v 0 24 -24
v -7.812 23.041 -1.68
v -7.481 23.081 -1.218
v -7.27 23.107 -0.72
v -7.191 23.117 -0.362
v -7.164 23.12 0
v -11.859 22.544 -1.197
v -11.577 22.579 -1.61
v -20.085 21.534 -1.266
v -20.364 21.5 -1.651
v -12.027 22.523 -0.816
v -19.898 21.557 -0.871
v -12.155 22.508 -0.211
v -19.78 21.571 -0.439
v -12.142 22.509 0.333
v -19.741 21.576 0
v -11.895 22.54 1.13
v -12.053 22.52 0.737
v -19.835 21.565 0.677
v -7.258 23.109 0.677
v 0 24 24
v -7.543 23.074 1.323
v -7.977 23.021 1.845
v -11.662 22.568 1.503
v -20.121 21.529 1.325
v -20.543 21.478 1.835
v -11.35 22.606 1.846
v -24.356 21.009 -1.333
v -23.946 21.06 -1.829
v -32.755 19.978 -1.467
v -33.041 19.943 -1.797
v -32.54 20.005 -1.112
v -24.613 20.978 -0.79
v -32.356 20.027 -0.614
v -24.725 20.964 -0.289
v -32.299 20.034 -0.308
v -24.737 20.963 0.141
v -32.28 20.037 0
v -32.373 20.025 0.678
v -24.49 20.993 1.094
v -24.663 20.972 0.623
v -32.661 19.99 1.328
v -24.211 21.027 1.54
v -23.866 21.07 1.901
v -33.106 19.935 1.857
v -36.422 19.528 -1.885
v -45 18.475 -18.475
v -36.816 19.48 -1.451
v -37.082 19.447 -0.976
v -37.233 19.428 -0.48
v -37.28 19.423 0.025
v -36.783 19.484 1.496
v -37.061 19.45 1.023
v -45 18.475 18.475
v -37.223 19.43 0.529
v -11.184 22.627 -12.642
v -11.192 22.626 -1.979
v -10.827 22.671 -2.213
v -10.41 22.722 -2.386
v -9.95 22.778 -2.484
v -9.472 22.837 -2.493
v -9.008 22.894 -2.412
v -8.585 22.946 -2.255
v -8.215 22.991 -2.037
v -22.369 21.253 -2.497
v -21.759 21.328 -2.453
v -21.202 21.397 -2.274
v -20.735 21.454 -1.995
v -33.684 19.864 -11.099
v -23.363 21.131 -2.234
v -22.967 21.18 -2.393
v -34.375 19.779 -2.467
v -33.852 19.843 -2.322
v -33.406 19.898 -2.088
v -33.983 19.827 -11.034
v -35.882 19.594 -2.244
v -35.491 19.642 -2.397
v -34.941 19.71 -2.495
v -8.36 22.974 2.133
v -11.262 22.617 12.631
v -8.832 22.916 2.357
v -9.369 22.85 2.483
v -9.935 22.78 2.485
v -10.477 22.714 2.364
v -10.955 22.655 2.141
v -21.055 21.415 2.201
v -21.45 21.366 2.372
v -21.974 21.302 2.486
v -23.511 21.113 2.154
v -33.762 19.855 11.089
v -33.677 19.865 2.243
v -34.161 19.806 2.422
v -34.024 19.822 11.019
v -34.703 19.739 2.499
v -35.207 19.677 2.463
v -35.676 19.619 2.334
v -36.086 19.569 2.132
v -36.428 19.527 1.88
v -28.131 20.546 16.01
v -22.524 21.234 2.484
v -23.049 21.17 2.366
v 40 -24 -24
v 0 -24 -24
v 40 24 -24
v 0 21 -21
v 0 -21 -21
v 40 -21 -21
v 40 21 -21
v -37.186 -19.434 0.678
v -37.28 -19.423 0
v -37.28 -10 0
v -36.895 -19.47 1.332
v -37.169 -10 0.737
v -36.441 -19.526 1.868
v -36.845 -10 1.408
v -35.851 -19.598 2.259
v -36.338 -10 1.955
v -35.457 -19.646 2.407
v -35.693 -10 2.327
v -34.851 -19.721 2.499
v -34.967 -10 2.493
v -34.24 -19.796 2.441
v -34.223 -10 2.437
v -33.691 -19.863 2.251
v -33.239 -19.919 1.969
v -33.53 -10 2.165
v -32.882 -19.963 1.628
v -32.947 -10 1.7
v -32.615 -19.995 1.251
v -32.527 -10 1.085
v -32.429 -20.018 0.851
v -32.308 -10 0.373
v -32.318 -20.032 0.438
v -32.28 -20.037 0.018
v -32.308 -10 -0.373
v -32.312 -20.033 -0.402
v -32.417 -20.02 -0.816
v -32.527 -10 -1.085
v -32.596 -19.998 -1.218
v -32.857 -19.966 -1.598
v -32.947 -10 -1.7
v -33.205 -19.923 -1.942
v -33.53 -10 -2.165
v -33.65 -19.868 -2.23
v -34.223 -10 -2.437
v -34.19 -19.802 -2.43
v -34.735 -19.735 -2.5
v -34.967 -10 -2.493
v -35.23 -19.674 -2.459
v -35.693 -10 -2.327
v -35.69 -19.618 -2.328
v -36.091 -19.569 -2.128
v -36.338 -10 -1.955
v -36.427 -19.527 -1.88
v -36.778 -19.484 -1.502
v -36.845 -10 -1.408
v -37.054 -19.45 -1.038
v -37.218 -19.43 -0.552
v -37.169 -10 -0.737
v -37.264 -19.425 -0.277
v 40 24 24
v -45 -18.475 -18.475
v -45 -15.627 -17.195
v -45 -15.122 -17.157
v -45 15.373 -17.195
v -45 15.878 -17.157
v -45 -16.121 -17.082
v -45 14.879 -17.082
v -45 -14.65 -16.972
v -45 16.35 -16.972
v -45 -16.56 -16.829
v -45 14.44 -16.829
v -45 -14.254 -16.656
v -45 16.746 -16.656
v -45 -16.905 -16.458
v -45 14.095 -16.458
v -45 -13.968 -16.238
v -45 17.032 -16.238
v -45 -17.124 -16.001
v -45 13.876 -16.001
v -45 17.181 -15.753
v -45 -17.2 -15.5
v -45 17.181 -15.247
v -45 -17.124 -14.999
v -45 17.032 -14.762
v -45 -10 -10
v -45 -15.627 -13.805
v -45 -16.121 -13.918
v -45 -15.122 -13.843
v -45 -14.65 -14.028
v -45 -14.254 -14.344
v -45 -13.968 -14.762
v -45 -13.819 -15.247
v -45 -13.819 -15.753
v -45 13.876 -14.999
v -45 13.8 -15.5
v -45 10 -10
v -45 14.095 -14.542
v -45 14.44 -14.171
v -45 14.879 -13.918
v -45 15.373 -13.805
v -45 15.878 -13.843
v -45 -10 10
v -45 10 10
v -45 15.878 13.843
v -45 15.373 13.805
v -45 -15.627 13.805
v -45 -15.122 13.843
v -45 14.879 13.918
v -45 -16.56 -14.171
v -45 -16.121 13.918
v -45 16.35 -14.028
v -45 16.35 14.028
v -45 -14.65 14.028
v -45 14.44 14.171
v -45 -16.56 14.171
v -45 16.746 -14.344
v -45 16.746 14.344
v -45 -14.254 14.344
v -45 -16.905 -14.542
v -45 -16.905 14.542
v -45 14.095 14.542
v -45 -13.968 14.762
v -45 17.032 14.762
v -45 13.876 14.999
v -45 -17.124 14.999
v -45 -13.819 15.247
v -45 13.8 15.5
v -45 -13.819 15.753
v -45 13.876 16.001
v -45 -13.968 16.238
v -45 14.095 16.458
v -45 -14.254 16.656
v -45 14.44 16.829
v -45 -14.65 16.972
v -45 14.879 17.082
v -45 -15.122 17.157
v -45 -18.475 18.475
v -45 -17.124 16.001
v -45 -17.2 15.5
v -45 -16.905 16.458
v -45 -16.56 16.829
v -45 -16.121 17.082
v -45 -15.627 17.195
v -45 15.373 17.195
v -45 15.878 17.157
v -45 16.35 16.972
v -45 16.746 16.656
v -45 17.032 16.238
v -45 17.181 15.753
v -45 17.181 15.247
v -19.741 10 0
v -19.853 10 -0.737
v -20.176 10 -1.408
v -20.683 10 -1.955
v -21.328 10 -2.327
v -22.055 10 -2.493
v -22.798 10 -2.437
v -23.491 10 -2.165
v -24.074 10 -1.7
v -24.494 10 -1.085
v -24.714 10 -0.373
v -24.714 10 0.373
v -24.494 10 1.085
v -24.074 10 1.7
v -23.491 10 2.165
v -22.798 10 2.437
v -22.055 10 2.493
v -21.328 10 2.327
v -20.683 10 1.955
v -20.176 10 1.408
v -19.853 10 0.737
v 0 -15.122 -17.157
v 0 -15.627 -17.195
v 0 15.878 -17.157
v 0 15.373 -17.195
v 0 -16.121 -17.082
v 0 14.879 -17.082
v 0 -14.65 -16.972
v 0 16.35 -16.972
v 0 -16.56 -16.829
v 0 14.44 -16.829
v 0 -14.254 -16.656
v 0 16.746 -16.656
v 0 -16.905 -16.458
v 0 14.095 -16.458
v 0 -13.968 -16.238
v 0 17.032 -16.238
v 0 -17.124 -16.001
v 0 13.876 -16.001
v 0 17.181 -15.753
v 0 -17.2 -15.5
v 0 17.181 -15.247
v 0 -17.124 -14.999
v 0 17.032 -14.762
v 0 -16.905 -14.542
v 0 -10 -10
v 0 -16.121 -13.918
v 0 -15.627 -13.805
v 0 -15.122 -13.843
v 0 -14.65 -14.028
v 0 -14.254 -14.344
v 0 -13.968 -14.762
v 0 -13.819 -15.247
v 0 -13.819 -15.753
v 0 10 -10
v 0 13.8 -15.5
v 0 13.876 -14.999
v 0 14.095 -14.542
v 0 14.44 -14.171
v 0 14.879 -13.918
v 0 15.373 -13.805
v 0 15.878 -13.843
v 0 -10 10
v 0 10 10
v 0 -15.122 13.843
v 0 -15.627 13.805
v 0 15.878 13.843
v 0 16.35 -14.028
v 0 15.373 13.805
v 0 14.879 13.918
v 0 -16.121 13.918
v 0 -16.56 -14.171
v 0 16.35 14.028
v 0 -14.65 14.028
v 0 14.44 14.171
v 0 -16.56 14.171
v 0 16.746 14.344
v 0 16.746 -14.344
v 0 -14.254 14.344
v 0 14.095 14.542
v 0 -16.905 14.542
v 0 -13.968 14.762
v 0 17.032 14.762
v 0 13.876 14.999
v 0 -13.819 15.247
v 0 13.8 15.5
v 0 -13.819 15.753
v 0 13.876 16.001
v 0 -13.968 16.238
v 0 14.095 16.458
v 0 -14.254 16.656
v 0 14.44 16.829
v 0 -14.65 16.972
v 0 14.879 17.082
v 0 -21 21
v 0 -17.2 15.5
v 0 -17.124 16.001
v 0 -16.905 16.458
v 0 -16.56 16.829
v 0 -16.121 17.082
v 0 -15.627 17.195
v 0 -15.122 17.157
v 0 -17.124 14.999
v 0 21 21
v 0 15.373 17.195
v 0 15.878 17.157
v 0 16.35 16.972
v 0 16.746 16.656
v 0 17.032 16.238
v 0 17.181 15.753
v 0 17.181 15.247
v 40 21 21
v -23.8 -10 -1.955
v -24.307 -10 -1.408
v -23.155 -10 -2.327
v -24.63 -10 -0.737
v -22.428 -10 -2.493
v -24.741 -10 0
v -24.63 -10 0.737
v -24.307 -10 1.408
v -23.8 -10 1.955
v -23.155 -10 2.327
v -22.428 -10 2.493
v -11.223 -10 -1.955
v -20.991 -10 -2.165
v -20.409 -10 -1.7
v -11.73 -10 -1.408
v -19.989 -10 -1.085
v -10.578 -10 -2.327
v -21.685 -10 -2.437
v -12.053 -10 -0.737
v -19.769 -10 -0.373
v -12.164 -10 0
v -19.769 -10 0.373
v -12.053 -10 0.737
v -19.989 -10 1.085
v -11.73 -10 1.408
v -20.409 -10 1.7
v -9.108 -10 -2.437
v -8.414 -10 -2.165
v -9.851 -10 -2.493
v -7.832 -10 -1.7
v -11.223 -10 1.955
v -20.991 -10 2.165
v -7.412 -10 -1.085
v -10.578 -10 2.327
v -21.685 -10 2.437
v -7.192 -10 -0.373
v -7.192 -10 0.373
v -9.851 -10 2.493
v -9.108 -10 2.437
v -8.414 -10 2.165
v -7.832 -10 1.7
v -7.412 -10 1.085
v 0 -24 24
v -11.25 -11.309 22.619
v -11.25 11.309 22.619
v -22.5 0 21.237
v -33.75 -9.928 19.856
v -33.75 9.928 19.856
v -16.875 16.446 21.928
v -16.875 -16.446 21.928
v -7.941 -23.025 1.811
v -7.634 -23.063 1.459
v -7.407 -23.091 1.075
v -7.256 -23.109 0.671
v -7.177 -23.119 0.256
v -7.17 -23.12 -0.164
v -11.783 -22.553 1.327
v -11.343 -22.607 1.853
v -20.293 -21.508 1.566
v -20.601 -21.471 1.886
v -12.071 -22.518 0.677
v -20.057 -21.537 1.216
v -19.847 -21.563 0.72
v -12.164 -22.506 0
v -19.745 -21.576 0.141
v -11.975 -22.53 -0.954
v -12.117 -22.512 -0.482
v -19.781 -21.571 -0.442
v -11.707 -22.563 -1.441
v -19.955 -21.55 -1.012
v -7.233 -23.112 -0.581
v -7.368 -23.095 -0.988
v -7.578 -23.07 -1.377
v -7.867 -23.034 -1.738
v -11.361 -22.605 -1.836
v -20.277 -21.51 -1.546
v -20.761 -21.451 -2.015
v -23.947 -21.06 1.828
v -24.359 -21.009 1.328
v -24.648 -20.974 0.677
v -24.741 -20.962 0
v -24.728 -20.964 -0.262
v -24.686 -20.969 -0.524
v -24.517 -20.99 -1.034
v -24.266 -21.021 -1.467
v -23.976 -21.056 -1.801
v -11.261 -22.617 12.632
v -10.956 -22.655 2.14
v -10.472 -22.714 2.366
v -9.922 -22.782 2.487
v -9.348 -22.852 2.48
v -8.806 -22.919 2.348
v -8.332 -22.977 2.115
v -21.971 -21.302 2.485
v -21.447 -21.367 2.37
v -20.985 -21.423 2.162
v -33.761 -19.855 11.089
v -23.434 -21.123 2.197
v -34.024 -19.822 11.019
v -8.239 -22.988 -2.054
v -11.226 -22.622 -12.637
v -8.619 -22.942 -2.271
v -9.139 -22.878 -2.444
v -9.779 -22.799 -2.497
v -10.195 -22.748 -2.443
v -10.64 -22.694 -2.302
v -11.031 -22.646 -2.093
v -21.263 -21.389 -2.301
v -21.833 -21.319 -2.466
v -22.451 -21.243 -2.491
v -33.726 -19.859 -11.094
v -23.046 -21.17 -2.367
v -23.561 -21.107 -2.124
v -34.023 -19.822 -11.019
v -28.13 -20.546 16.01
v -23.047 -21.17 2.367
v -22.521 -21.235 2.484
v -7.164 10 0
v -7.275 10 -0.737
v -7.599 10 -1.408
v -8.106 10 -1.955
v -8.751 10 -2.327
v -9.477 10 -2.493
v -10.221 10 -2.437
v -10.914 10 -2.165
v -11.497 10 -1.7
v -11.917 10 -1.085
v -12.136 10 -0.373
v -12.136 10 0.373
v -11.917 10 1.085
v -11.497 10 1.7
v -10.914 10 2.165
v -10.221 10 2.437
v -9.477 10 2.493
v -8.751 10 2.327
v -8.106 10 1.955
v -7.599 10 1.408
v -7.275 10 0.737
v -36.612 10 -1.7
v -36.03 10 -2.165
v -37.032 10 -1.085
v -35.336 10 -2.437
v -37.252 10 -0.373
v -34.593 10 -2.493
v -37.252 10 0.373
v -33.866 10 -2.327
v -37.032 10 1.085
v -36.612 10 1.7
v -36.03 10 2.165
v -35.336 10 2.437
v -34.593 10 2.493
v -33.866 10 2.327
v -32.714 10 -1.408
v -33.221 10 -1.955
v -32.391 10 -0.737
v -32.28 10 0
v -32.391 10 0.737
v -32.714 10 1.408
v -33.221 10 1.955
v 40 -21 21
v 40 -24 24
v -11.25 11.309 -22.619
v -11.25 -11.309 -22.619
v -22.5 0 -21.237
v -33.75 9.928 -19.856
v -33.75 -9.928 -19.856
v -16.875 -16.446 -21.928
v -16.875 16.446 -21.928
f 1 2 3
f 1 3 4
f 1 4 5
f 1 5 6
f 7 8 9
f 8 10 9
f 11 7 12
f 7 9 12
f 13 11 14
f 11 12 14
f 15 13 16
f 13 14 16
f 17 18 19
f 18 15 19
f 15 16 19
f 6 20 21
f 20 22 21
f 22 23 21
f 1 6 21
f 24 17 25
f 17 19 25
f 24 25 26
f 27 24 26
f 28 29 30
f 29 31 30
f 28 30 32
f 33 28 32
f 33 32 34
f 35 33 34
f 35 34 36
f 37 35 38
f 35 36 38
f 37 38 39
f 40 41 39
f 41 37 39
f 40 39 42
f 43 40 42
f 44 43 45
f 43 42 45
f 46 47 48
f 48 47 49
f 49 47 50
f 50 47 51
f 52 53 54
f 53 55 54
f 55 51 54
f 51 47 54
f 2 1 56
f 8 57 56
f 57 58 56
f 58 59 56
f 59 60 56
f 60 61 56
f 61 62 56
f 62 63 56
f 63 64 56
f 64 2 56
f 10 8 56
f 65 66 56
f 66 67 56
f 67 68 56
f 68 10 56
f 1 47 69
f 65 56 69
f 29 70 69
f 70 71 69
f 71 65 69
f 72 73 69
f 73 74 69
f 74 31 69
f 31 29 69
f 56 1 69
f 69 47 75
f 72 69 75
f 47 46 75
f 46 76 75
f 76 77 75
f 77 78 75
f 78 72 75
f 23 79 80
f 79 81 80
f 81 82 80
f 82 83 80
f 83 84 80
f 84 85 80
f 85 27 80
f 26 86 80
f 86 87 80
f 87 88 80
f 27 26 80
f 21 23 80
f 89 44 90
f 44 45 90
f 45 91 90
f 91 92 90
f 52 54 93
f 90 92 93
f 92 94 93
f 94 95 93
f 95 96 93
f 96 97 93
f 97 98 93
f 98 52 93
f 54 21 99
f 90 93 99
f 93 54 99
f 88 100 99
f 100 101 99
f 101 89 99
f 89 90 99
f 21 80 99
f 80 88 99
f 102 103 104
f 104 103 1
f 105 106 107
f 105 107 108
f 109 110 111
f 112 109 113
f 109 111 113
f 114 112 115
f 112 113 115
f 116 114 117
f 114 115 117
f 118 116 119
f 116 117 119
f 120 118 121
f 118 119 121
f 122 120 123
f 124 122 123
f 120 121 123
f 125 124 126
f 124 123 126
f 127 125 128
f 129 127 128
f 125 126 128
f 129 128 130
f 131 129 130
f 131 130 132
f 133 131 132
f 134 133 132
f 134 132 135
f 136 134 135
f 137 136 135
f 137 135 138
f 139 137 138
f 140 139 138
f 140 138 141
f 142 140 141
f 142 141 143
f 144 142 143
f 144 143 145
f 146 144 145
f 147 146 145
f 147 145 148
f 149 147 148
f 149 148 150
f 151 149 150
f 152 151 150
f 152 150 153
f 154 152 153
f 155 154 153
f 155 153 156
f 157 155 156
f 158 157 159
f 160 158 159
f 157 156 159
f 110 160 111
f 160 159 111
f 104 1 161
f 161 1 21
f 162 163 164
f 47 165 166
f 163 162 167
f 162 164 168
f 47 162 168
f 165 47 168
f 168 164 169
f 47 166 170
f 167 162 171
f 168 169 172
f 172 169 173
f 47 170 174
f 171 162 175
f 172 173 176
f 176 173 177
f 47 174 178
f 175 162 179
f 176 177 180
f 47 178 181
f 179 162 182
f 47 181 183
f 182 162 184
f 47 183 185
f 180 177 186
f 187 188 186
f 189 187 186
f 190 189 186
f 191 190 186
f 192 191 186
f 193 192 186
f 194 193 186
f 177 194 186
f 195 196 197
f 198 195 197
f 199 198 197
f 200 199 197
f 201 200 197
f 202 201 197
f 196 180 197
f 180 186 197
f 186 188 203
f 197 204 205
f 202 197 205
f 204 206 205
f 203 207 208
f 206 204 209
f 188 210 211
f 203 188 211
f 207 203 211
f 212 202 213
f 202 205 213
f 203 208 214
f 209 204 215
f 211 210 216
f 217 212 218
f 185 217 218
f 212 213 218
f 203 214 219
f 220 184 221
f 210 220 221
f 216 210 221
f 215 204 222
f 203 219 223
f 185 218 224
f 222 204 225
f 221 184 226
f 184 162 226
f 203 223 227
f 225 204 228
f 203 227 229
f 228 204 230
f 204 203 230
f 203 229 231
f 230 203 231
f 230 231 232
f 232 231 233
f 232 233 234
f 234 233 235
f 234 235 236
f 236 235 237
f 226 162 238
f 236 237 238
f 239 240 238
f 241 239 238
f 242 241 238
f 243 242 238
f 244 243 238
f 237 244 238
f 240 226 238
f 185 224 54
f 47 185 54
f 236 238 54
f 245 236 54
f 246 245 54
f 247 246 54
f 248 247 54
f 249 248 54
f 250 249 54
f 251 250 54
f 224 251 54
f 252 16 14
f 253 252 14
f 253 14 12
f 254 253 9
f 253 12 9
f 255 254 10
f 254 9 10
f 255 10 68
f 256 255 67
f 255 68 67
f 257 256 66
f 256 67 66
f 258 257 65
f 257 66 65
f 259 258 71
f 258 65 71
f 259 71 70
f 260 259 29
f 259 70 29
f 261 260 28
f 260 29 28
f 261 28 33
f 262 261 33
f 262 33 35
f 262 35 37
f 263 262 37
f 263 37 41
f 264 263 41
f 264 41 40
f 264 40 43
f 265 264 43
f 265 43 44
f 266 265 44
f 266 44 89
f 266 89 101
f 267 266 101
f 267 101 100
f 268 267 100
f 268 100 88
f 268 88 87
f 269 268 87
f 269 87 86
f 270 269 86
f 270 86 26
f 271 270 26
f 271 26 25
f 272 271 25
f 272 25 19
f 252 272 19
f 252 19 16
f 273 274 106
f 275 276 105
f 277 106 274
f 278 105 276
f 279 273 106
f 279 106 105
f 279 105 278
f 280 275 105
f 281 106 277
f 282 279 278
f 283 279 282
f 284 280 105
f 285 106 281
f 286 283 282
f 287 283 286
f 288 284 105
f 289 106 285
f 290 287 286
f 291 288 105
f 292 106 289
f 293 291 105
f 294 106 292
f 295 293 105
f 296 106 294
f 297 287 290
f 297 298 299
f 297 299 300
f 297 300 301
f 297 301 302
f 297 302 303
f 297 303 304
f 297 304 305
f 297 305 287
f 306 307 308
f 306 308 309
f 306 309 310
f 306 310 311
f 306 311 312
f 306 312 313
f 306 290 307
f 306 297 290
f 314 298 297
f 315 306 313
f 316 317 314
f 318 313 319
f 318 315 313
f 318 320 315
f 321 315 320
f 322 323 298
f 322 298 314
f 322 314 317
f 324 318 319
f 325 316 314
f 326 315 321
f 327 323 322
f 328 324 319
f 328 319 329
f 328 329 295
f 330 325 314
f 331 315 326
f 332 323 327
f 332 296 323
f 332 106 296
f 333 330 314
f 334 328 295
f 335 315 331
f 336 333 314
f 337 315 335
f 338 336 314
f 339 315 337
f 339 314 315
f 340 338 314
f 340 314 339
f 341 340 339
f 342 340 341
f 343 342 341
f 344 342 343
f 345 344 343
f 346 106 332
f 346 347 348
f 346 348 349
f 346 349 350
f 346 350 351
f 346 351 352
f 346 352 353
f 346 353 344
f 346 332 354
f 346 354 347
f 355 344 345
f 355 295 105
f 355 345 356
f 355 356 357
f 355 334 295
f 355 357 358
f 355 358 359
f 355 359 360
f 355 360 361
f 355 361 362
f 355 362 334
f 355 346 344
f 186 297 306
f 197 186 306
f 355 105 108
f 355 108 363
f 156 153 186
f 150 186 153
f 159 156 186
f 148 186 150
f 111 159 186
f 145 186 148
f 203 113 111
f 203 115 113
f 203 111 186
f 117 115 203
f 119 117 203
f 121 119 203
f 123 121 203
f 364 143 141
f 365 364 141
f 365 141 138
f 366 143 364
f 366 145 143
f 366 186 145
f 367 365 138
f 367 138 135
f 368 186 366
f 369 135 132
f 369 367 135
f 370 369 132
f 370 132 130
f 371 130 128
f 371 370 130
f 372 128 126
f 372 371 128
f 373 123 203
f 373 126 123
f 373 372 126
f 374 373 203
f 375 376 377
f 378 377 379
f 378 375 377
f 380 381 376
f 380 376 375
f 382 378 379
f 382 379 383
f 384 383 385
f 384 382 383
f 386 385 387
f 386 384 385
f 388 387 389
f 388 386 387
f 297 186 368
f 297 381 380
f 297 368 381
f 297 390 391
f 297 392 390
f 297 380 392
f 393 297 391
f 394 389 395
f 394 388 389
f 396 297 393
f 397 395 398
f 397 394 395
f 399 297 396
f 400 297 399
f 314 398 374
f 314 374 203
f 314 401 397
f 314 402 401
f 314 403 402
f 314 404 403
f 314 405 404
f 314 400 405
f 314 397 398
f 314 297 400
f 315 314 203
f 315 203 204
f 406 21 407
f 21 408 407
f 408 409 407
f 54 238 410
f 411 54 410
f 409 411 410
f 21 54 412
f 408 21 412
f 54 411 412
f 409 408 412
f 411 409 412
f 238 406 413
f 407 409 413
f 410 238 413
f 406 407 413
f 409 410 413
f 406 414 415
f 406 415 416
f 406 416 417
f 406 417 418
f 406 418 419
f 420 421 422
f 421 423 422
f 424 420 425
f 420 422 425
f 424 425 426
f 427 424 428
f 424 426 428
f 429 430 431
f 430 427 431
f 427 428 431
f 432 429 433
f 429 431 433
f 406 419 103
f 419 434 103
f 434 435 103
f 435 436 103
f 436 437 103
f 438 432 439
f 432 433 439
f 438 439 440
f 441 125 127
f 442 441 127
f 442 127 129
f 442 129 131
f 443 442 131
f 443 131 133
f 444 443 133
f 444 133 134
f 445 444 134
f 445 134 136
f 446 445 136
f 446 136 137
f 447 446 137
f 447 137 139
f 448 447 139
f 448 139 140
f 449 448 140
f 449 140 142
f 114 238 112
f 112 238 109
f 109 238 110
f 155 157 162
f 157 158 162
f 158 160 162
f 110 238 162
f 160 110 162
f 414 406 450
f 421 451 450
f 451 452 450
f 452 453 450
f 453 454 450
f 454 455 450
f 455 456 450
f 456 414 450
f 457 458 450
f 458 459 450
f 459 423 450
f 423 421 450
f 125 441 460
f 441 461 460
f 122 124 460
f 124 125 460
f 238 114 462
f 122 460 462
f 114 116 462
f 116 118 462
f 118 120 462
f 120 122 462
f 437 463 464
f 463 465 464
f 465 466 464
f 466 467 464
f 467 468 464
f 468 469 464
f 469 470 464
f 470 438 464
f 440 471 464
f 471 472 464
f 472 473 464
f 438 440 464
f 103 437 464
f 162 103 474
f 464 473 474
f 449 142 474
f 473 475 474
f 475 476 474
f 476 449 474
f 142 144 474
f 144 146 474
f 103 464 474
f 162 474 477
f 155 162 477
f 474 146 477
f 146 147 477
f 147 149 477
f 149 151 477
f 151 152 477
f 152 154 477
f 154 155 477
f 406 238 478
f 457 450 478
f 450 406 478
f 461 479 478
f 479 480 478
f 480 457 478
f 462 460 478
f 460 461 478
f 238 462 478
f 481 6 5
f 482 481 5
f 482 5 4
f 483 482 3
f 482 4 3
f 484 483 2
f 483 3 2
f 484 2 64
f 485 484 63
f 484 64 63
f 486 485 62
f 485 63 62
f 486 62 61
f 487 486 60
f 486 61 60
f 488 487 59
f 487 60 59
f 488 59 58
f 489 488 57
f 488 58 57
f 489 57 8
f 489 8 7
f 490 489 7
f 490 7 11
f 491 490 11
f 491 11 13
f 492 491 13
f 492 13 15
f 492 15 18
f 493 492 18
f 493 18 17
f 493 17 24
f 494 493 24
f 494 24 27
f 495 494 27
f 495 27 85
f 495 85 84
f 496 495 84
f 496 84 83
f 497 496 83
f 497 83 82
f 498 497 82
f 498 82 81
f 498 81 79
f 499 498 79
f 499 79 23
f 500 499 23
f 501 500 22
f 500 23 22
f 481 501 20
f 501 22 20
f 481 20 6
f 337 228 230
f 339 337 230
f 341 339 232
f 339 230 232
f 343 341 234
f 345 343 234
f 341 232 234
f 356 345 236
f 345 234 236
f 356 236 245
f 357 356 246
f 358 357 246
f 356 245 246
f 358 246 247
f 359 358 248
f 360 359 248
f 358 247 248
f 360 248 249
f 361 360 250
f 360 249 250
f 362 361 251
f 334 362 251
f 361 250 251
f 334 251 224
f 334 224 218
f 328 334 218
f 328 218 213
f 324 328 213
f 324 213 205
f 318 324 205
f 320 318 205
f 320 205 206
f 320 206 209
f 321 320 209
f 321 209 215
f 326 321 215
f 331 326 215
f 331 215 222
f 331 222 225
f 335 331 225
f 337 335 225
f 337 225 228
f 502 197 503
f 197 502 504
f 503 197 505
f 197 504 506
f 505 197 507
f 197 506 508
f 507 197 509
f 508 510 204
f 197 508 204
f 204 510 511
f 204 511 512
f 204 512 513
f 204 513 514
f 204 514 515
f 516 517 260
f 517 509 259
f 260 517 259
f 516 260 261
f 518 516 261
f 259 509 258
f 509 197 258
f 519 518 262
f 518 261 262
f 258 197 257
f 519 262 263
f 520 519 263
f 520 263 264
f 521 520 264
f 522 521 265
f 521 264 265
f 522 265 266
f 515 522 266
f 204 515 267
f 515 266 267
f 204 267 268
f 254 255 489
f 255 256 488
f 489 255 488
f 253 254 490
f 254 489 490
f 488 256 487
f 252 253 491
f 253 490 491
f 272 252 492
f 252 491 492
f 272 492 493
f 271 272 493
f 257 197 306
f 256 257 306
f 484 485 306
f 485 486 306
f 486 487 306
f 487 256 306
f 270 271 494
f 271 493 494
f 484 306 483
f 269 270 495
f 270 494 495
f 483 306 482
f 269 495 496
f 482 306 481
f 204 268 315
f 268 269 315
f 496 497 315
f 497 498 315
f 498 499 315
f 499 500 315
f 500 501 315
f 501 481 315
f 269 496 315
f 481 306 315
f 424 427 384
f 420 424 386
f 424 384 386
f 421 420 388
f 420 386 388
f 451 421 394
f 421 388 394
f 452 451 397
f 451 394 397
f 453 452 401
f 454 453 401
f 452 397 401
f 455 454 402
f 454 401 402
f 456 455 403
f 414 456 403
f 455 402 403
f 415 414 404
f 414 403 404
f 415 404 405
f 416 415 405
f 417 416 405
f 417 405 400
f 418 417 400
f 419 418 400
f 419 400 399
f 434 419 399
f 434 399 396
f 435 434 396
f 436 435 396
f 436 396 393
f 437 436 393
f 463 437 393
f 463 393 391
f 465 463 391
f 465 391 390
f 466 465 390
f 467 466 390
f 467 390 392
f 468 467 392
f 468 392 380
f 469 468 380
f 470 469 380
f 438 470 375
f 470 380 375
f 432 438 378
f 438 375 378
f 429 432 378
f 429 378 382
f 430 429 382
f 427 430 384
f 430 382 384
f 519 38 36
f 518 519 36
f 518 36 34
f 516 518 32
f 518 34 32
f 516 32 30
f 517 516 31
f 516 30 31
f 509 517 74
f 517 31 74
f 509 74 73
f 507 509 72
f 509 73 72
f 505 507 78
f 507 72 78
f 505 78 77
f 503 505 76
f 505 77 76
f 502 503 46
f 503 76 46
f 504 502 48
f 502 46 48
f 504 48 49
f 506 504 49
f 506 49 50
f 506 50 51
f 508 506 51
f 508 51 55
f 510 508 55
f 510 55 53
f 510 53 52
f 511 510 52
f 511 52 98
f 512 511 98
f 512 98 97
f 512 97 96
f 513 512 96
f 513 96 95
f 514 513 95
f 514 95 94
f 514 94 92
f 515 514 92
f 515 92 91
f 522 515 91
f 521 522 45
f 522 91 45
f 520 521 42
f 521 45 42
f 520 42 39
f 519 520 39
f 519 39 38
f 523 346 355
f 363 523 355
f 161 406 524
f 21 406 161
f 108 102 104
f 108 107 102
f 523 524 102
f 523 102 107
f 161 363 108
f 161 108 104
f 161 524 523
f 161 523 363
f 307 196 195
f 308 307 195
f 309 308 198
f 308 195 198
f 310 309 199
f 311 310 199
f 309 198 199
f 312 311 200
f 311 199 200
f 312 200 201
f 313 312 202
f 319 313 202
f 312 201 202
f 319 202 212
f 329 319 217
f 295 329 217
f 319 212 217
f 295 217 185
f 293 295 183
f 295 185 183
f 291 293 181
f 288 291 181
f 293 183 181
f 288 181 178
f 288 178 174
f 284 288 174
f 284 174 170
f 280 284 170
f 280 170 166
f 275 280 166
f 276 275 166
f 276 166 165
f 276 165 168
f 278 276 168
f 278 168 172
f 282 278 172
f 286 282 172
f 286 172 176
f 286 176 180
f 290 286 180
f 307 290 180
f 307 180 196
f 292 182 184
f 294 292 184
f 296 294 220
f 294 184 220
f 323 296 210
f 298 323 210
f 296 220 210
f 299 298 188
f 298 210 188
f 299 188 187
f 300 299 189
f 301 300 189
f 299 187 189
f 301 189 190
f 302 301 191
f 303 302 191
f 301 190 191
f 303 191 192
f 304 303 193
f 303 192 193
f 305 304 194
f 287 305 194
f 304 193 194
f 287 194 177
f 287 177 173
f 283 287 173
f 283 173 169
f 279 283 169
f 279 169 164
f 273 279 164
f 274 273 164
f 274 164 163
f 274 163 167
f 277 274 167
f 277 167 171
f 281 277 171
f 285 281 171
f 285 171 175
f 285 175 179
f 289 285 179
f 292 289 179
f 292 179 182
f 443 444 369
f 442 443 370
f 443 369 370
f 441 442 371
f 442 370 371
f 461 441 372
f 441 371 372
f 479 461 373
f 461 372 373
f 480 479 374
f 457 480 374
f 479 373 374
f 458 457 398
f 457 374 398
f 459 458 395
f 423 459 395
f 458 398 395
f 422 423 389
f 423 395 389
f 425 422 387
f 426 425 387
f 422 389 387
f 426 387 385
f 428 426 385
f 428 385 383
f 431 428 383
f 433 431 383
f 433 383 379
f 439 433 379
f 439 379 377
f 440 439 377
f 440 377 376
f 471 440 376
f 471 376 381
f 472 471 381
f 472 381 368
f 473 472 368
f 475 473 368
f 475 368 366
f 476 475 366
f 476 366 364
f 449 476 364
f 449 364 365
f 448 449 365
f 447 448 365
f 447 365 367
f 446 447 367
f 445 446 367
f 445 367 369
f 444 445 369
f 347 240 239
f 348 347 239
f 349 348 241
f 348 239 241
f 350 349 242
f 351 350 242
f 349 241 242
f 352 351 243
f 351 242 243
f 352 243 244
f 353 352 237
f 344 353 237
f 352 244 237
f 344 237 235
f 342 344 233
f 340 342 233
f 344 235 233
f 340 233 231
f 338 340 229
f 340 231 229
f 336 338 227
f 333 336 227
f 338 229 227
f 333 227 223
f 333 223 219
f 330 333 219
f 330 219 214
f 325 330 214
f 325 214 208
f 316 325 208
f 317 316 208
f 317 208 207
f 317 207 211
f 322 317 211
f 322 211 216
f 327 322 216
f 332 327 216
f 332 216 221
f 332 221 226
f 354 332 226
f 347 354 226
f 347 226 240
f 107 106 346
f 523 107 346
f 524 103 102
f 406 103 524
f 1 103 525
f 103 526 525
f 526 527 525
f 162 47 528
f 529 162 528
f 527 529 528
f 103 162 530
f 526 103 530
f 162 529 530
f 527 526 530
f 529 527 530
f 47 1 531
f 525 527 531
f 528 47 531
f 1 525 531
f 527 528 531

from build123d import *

# Parameters (mm, degrees)
F0_W     = 48
F0_H     = 48
F0_W_2   = 42
F0_H_2   = 42
F0_W_3   = 20
F0_H_3   = 20
F1_DEPTH = 45
F1_TAPER = 7
F2_DEPTH = 60
F3_DEPTH = 40
F4_D     = 3.4
F6_D     = 5
F6_DEPTH = 69
F6_TIP   = 1.5021515476
F7_D     = 5
F7_DEPTH = 69
F7_TIP   = 1.5021515476


with BuildPart() as f1:
    # F0 (on Right) → F1 (new body)
    with BuildSketch(Plane.YZ):
        Rectangle(F0_W, F0_H)
        Rectangle(F0_W_2, F0_H_2, mode=Mode.SUBTRACT)
        Rectangle(F0_W_2, F0_H_2)
        Rectangle(F0_W_3, F0_H_3, mode=Mode.SUBTRACT)
        Rectangle(F0_W_3, F0_H_3)
    extrude(amount=-F1_DEPTH, taper=F1_TAPER)

    # F0 (on Right) → F2 (cut)
    with BuildSketch(Plane.YZ):
        Rectangle(F0_W_3, F0_H_3)
    extrude(amount=-F2_DEPTH, mode=Mode.SUBTRACT)

    # F0 (on Right) → F3 (join)
    with BuildSketch(Plane.YZ):
        Rectangle(F0_W, F0_H)
        Rectangle(F0_W_2, F0_H_2, mode=Mode.SUBTRACT)
    extrude(amount=F3_DEPTH)

    # F4 (through all)
    with Locations(Plane.YZ):
        with Locations((15.5, 15.5), (-15.5, 15.5), (-15.5, -15.5), (15.5, -15.5)):
            Hole(F4_D / 2)

    # F6 (one way)
    with BuildSketch(Plane(origin=(0, -10, 0), x_dir=(-1, 0, 0), z_dir=(0, 1, 0))):
        with Locations((34.7797162831, 0), (22.2414657474, 0), (9.6642384306, 0)):
            Circle(F6_D / 2)
    extrude(amount=-F6_DEPTH, mode=Mode.SUBTRACT)
    with Locations(Plane(origin=(0, -10, 0), x_dir=(-1, 0, 0), z_dir=(0, 1, 0))):
        with Locations((34.7797162831, 0), (22.2414657474, 0), (9.6642384306, 0)):
            with Locations((0, 0, -(F6_DEPTH + F6_TIP / 2))):  # 118° drill point
                Cone(0, F6_D / 2, F6_TIP, mode=Mode.SUBTRACT)

    # F7
    with Locations(Plane(origin=(0, -10, 0), x_dir=(-1, 0, 0), z_dir=(0, -1, 0))):
        with Locations((34.7797162831, 0), (22.2414657474, 0), (9.6642384306, 0)):
            Hole(F7_D / 2, depth=F7_DEPTH)
            with Locations((0, 0, -(F7_DEPTH + F7_TIP / 2))):  # 118° drill point
                Cone(0, F7_D / 2, F7_TIP, mode=Mode.SUBTRACT)


solid = f1.part
